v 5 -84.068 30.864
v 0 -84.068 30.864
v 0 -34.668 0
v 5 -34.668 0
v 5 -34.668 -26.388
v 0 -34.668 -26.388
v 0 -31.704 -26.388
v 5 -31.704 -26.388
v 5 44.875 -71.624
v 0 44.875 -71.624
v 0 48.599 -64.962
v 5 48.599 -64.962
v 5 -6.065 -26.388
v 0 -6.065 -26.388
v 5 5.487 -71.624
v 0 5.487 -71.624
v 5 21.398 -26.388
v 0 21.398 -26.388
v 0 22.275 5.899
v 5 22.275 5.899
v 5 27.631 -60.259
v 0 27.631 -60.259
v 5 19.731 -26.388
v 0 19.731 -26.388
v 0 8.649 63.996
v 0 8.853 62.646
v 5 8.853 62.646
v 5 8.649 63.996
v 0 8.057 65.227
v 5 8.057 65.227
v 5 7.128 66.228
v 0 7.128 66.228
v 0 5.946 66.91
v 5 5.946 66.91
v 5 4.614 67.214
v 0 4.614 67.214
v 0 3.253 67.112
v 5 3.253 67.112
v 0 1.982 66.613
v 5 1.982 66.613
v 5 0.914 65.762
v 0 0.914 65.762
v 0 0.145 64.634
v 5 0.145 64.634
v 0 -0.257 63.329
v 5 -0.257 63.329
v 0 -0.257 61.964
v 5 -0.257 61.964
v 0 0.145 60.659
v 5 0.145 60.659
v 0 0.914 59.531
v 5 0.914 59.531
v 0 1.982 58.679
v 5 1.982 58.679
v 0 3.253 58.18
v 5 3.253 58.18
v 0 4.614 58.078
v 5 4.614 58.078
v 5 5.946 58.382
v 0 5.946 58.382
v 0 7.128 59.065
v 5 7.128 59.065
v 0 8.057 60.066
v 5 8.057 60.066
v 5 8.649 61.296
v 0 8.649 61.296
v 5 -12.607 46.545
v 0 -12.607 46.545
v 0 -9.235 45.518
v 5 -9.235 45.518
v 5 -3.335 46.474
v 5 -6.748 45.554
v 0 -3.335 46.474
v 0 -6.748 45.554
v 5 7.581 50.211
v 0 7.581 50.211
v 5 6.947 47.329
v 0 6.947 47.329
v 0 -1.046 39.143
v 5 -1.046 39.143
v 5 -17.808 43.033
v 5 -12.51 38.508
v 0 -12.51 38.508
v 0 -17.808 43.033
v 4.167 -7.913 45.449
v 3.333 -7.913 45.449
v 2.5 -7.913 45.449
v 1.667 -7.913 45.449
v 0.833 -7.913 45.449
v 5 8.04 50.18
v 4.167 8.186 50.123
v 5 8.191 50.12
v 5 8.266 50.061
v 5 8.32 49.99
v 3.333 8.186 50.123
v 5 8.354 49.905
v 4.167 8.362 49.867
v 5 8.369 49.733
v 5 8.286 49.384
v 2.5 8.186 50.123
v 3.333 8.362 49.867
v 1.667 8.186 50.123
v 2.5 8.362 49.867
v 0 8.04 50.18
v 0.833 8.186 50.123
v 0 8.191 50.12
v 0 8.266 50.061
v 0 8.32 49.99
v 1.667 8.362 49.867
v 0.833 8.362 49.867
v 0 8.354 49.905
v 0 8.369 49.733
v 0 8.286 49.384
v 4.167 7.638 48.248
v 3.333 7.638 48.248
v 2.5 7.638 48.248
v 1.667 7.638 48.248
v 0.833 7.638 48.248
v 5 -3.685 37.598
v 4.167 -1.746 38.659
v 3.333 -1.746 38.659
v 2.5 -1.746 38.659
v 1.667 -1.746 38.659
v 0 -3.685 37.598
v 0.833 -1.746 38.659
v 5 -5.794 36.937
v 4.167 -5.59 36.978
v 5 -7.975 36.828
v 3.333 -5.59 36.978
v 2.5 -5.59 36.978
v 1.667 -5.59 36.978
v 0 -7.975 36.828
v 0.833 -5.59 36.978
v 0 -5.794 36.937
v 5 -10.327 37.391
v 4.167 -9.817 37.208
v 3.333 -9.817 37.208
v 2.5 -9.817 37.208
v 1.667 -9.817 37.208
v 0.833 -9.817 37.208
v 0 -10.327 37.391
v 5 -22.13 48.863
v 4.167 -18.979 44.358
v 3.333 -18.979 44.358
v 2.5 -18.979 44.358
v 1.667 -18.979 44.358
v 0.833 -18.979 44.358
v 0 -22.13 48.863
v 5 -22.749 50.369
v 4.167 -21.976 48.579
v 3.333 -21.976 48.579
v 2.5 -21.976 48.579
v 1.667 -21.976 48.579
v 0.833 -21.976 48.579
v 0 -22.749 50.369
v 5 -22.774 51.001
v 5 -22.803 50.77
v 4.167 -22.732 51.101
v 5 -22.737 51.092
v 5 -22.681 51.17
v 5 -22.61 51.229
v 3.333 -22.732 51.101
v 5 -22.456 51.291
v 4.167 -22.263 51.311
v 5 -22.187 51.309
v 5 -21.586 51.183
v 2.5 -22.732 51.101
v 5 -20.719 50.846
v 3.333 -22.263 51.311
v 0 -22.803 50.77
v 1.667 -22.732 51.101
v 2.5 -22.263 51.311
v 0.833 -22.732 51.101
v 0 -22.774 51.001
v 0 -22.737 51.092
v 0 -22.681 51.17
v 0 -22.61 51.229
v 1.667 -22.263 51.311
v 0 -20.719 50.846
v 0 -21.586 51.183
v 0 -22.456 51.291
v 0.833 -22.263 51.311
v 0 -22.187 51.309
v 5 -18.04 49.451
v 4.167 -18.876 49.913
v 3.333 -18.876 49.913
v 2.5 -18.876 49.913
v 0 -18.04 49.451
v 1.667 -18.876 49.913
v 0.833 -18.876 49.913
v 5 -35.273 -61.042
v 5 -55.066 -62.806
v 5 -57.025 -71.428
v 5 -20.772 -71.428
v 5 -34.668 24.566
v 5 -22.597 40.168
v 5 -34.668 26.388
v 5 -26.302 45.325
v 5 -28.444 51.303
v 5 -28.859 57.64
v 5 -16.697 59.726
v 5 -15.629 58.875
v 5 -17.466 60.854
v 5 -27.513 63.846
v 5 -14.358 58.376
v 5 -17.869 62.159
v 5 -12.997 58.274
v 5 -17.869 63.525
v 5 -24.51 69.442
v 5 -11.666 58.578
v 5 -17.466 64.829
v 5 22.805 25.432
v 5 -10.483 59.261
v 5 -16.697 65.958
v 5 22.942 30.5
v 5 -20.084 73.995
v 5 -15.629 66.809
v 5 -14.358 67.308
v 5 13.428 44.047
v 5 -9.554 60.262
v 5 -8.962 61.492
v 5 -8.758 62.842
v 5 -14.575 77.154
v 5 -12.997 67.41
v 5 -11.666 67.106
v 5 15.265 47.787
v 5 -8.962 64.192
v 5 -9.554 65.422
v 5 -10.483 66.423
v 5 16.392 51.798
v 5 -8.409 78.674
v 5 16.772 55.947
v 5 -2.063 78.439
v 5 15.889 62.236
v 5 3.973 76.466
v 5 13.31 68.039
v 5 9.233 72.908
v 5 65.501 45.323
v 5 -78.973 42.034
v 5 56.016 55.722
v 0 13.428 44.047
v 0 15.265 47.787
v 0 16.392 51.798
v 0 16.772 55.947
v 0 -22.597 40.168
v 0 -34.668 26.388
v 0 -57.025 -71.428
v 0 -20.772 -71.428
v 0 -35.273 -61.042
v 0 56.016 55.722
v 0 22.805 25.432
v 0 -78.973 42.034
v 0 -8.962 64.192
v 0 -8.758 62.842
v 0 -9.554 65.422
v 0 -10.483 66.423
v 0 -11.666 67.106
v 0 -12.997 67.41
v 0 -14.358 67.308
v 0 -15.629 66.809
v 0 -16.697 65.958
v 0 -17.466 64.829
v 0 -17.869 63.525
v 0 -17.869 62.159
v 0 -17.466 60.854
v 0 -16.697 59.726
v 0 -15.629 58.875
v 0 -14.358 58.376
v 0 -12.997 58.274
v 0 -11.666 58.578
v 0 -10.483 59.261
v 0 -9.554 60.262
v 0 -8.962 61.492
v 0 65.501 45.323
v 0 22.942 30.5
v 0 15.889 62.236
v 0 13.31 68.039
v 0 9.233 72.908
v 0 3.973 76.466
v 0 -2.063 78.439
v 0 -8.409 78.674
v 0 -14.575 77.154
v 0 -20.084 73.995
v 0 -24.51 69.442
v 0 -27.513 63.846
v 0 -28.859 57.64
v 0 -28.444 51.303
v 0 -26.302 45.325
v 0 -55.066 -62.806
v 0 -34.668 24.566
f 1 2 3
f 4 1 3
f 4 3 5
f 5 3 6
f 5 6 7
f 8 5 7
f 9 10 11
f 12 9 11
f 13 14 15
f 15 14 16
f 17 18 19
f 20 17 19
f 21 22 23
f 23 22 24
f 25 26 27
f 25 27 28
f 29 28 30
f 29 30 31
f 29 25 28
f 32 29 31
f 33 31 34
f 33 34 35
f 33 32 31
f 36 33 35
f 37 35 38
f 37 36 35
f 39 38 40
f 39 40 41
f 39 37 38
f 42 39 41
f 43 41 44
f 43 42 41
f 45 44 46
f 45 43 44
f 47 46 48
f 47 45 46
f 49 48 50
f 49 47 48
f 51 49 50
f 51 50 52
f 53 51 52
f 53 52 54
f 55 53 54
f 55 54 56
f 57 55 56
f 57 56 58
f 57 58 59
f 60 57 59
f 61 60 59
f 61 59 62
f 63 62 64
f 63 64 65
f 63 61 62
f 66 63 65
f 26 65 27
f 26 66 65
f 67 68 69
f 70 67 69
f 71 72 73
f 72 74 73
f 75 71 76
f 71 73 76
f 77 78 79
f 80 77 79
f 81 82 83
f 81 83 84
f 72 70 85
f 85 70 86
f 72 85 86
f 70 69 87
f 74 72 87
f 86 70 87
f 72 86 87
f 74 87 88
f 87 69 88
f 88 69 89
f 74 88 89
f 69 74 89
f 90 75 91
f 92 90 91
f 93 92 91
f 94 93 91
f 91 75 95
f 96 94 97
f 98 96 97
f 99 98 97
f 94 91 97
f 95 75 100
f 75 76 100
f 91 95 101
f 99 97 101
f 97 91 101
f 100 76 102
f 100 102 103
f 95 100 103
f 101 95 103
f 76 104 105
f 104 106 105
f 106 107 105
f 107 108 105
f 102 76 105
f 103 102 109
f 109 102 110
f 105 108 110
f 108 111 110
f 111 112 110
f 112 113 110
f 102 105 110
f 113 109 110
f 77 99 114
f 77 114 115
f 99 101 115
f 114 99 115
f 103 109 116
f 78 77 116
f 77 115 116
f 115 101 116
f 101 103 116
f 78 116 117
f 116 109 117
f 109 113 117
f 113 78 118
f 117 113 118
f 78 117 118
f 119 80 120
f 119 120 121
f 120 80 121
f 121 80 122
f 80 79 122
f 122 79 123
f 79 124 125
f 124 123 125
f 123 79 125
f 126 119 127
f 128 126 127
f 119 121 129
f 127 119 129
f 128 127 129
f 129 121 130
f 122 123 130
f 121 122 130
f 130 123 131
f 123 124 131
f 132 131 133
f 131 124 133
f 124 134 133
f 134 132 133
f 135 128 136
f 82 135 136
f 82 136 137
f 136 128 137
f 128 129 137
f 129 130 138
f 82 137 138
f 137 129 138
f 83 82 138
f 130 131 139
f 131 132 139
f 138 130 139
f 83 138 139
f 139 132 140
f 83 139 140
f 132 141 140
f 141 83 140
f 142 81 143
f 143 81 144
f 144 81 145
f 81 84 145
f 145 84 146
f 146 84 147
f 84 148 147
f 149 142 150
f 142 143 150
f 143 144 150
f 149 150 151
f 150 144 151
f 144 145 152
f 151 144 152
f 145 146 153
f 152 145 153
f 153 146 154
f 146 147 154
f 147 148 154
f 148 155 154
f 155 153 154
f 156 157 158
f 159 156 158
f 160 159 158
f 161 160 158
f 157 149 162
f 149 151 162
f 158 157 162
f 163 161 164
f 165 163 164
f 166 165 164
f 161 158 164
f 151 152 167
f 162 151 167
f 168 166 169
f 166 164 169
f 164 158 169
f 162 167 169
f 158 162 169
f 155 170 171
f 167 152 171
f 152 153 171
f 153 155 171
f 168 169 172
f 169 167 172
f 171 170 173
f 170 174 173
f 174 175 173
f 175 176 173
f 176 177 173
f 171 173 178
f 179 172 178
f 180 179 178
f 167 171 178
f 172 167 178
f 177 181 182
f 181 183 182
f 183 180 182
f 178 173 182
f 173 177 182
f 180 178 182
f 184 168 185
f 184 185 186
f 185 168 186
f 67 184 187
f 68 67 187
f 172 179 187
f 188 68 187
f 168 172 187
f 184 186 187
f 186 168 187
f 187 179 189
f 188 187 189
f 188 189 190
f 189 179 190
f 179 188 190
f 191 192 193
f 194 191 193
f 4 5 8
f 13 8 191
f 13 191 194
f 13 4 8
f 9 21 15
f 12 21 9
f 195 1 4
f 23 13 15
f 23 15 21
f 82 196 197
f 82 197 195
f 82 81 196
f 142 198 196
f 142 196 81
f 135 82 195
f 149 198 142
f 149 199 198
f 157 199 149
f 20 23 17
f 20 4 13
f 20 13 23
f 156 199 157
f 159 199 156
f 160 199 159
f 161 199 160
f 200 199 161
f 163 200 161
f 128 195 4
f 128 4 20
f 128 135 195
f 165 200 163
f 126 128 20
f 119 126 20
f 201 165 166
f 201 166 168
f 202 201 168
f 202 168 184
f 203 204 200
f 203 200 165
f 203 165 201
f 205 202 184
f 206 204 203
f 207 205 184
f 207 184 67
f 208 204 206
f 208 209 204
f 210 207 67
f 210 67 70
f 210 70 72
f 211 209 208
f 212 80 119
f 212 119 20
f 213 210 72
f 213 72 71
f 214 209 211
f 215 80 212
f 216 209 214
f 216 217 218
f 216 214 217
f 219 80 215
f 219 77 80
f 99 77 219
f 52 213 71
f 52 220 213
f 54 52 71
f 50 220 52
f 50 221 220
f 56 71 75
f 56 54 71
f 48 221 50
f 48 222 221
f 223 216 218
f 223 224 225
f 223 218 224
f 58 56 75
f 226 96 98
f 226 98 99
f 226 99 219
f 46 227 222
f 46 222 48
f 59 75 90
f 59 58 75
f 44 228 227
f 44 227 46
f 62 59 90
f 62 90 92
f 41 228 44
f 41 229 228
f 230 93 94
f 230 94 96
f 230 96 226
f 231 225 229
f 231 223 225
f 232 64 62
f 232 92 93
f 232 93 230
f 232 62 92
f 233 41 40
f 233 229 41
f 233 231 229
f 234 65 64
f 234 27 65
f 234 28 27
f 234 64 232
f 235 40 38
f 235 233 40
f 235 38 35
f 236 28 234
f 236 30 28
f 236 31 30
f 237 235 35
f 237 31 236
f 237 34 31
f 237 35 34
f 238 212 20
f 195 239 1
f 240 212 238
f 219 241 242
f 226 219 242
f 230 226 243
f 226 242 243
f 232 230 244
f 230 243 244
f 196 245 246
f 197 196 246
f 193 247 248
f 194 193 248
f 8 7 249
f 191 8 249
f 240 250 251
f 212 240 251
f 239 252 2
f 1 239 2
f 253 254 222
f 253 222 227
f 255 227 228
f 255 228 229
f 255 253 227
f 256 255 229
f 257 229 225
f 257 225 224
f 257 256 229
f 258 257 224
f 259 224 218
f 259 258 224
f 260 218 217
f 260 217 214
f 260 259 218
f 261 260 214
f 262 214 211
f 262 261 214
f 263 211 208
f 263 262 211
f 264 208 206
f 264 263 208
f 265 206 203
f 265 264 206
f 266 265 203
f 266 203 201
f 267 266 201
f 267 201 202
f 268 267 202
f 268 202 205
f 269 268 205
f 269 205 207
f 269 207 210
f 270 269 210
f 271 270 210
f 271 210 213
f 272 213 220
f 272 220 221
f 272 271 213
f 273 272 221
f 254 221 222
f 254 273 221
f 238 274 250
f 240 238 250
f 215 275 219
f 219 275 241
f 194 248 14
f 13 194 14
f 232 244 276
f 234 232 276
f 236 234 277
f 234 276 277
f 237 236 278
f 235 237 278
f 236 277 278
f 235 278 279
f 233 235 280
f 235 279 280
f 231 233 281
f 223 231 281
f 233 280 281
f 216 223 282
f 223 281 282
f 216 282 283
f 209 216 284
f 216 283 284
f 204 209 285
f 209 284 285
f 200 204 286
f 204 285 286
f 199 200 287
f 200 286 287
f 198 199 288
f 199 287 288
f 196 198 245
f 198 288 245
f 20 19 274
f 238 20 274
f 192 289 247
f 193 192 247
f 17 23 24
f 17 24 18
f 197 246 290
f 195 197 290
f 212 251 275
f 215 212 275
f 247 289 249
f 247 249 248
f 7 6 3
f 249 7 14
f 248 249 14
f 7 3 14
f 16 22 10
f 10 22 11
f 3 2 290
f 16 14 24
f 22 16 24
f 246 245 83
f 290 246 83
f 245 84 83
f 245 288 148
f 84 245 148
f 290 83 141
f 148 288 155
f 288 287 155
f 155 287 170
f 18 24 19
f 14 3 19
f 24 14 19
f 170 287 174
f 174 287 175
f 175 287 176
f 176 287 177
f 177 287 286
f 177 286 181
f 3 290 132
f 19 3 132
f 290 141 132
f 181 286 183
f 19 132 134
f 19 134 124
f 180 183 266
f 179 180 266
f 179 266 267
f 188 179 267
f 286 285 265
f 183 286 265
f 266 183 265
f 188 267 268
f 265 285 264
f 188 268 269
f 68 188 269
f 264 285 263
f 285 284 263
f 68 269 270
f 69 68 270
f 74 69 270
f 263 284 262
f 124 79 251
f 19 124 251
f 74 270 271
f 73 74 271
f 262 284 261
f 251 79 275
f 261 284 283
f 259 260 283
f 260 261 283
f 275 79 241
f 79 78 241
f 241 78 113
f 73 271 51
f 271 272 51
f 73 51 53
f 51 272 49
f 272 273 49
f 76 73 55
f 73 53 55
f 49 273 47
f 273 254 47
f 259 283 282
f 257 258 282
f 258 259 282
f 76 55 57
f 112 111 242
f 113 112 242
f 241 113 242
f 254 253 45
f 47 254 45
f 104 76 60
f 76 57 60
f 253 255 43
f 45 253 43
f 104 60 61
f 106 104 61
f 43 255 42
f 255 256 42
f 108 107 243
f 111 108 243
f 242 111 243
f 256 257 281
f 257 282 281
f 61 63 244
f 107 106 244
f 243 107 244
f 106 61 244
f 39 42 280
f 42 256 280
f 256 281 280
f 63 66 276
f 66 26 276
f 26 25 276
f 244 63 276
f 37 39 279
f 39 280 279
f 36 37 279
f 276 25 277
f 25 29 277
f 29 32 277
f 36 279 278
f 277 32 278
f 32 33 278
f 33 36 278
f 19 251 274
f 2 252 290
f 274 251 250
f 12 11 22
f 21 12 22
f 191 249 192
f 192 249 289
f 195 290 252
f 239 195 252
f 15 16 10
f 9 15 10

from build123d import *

# Parameters (mm, degrees)
F0_R     = 4.5807461666
F1_DEPTH = 5


with BuildPart() as f1:
    # F0 (on Right) → F1 (new body)
    with BuildSketch(Plane.YZ):
        Polygon((-34.6681401134, 0), (-34.6681401134, 24.5658417454), (-78.9729505777, 42.0339927077), (-84.0679854155, 30.864123255), align=None)
        with BuildLine():
            ThreePointArc((13.4277175006, 44.0469511481), (-3.6287113263, 33.2320263344), (-22.5966290731, 40.1676199935))
            Line((-22.5966290731, 40.1676199935), (-34.6681401134, 26.388078928))
            Line((-34.6681401134, 26.388078928), (-34.6681401134, 24.5658417454))
            Line((-34.6681401134, 24.5658417454), (-34.6681401134, 0))
            Line((-34.6681401134, 0), (-34.6681401134, -26.388078928))
            Line((-34.6681401134, -26.388078928), (-31.7037368685, -26.388078928))
            Line((-31.7037368685, -26.388078928), (-6.064720462, -26.388078928))
            Line((-6.064720462, -26.388078928), (19.730867818, -26.388078928))
            Line((19.730867818, -26.388078928), (21.398472267, -26.388078928))
            Line((21.398472267, -26.388078928), (22.27470465, 5.8991014957))
            Line((22.27470465, 5.8991014957), (22.8048125706, 25.4323787472))
            Line((22.8048125706, 25.4323787472), (22.9423311885, 30.4996286171))
            Line((22.9423311885, 30.4996286171), (13.4277175006, 44.0469511481))
        make_face()
        Polygon((56.0163809995, 55.7224714079), (22.8048125706, 25.4323787472), (22.27470465, 5.8991014957), (65.5010460578, 45.3230115535), align=None)
        Polygon((27.6307370514, -60.2585151792), (19.730867818, -26.388078928), (-6.064720462, -26.388078928), (5.4869563319, -71.624353528), (44.8754541576, -71.624353528), (48.5987402499, -64.9616196752), align=None)
        Polygon((-6.064720462, -26.388078928), (-31.7037368685, -26.388078928), (-35.2732762694, -61.042368412), (-55.0655052066, -62.806032598), (-57.0251345634, -71.4283809066), (-20.7720398903, -71.4283809066), align=None)
        with BuildLine():
            ThreePointArc((13.4277175006, 44.0469511481), (15.9198975215, 49.7666821609), (16.7718013439, 55.9473410249))
            ThreePointArc((16.7718013439, 55.9473410249), (-14.5748908513, 77.153901975), (-22.5966290731, 40.1676199935))
            ThreePointArc((-22.5966290731, 40.1676199935), (-3.6287113263, 33.2320263344), (13.4277175006, 44.0469511481))
        make_face()
        with Locations((-13.339035213, 62.8419443965)):
            Circle(F0_R, mode=Mode.SUBTRACT)
        with BuildLine():
            add(Edge.make_bspline(
                [(-12.6072922722, 46.544931829), (-9.0128031388, 44.9351226284), (-4.412702671, 45.5666658929), (11.5693769065, 52.762551564), (4.04092859, 43.7398052008), (-9.2131207397, 29.6946913752), (-29.3237043143, 57.4649397701), (-16.4981365756, 48.2874651141), (-12.6072922722, 46.544931829)],
                knots=[0, 0, 0, 0, 0.1480746148, 0.3138035161, 0.4355370979, 0.6302092462, 0.839717064, 1, 1, 1, 1], degree=3))
        make_face(mode=Mode.SUBTRACT)
        with Locations((4.272154998, 62.6462697983)):
            Circle(F0_R, mode=Mode.SUBTRACT)
    extrude(amount=F1_DEPTH)


solid = f1.part
